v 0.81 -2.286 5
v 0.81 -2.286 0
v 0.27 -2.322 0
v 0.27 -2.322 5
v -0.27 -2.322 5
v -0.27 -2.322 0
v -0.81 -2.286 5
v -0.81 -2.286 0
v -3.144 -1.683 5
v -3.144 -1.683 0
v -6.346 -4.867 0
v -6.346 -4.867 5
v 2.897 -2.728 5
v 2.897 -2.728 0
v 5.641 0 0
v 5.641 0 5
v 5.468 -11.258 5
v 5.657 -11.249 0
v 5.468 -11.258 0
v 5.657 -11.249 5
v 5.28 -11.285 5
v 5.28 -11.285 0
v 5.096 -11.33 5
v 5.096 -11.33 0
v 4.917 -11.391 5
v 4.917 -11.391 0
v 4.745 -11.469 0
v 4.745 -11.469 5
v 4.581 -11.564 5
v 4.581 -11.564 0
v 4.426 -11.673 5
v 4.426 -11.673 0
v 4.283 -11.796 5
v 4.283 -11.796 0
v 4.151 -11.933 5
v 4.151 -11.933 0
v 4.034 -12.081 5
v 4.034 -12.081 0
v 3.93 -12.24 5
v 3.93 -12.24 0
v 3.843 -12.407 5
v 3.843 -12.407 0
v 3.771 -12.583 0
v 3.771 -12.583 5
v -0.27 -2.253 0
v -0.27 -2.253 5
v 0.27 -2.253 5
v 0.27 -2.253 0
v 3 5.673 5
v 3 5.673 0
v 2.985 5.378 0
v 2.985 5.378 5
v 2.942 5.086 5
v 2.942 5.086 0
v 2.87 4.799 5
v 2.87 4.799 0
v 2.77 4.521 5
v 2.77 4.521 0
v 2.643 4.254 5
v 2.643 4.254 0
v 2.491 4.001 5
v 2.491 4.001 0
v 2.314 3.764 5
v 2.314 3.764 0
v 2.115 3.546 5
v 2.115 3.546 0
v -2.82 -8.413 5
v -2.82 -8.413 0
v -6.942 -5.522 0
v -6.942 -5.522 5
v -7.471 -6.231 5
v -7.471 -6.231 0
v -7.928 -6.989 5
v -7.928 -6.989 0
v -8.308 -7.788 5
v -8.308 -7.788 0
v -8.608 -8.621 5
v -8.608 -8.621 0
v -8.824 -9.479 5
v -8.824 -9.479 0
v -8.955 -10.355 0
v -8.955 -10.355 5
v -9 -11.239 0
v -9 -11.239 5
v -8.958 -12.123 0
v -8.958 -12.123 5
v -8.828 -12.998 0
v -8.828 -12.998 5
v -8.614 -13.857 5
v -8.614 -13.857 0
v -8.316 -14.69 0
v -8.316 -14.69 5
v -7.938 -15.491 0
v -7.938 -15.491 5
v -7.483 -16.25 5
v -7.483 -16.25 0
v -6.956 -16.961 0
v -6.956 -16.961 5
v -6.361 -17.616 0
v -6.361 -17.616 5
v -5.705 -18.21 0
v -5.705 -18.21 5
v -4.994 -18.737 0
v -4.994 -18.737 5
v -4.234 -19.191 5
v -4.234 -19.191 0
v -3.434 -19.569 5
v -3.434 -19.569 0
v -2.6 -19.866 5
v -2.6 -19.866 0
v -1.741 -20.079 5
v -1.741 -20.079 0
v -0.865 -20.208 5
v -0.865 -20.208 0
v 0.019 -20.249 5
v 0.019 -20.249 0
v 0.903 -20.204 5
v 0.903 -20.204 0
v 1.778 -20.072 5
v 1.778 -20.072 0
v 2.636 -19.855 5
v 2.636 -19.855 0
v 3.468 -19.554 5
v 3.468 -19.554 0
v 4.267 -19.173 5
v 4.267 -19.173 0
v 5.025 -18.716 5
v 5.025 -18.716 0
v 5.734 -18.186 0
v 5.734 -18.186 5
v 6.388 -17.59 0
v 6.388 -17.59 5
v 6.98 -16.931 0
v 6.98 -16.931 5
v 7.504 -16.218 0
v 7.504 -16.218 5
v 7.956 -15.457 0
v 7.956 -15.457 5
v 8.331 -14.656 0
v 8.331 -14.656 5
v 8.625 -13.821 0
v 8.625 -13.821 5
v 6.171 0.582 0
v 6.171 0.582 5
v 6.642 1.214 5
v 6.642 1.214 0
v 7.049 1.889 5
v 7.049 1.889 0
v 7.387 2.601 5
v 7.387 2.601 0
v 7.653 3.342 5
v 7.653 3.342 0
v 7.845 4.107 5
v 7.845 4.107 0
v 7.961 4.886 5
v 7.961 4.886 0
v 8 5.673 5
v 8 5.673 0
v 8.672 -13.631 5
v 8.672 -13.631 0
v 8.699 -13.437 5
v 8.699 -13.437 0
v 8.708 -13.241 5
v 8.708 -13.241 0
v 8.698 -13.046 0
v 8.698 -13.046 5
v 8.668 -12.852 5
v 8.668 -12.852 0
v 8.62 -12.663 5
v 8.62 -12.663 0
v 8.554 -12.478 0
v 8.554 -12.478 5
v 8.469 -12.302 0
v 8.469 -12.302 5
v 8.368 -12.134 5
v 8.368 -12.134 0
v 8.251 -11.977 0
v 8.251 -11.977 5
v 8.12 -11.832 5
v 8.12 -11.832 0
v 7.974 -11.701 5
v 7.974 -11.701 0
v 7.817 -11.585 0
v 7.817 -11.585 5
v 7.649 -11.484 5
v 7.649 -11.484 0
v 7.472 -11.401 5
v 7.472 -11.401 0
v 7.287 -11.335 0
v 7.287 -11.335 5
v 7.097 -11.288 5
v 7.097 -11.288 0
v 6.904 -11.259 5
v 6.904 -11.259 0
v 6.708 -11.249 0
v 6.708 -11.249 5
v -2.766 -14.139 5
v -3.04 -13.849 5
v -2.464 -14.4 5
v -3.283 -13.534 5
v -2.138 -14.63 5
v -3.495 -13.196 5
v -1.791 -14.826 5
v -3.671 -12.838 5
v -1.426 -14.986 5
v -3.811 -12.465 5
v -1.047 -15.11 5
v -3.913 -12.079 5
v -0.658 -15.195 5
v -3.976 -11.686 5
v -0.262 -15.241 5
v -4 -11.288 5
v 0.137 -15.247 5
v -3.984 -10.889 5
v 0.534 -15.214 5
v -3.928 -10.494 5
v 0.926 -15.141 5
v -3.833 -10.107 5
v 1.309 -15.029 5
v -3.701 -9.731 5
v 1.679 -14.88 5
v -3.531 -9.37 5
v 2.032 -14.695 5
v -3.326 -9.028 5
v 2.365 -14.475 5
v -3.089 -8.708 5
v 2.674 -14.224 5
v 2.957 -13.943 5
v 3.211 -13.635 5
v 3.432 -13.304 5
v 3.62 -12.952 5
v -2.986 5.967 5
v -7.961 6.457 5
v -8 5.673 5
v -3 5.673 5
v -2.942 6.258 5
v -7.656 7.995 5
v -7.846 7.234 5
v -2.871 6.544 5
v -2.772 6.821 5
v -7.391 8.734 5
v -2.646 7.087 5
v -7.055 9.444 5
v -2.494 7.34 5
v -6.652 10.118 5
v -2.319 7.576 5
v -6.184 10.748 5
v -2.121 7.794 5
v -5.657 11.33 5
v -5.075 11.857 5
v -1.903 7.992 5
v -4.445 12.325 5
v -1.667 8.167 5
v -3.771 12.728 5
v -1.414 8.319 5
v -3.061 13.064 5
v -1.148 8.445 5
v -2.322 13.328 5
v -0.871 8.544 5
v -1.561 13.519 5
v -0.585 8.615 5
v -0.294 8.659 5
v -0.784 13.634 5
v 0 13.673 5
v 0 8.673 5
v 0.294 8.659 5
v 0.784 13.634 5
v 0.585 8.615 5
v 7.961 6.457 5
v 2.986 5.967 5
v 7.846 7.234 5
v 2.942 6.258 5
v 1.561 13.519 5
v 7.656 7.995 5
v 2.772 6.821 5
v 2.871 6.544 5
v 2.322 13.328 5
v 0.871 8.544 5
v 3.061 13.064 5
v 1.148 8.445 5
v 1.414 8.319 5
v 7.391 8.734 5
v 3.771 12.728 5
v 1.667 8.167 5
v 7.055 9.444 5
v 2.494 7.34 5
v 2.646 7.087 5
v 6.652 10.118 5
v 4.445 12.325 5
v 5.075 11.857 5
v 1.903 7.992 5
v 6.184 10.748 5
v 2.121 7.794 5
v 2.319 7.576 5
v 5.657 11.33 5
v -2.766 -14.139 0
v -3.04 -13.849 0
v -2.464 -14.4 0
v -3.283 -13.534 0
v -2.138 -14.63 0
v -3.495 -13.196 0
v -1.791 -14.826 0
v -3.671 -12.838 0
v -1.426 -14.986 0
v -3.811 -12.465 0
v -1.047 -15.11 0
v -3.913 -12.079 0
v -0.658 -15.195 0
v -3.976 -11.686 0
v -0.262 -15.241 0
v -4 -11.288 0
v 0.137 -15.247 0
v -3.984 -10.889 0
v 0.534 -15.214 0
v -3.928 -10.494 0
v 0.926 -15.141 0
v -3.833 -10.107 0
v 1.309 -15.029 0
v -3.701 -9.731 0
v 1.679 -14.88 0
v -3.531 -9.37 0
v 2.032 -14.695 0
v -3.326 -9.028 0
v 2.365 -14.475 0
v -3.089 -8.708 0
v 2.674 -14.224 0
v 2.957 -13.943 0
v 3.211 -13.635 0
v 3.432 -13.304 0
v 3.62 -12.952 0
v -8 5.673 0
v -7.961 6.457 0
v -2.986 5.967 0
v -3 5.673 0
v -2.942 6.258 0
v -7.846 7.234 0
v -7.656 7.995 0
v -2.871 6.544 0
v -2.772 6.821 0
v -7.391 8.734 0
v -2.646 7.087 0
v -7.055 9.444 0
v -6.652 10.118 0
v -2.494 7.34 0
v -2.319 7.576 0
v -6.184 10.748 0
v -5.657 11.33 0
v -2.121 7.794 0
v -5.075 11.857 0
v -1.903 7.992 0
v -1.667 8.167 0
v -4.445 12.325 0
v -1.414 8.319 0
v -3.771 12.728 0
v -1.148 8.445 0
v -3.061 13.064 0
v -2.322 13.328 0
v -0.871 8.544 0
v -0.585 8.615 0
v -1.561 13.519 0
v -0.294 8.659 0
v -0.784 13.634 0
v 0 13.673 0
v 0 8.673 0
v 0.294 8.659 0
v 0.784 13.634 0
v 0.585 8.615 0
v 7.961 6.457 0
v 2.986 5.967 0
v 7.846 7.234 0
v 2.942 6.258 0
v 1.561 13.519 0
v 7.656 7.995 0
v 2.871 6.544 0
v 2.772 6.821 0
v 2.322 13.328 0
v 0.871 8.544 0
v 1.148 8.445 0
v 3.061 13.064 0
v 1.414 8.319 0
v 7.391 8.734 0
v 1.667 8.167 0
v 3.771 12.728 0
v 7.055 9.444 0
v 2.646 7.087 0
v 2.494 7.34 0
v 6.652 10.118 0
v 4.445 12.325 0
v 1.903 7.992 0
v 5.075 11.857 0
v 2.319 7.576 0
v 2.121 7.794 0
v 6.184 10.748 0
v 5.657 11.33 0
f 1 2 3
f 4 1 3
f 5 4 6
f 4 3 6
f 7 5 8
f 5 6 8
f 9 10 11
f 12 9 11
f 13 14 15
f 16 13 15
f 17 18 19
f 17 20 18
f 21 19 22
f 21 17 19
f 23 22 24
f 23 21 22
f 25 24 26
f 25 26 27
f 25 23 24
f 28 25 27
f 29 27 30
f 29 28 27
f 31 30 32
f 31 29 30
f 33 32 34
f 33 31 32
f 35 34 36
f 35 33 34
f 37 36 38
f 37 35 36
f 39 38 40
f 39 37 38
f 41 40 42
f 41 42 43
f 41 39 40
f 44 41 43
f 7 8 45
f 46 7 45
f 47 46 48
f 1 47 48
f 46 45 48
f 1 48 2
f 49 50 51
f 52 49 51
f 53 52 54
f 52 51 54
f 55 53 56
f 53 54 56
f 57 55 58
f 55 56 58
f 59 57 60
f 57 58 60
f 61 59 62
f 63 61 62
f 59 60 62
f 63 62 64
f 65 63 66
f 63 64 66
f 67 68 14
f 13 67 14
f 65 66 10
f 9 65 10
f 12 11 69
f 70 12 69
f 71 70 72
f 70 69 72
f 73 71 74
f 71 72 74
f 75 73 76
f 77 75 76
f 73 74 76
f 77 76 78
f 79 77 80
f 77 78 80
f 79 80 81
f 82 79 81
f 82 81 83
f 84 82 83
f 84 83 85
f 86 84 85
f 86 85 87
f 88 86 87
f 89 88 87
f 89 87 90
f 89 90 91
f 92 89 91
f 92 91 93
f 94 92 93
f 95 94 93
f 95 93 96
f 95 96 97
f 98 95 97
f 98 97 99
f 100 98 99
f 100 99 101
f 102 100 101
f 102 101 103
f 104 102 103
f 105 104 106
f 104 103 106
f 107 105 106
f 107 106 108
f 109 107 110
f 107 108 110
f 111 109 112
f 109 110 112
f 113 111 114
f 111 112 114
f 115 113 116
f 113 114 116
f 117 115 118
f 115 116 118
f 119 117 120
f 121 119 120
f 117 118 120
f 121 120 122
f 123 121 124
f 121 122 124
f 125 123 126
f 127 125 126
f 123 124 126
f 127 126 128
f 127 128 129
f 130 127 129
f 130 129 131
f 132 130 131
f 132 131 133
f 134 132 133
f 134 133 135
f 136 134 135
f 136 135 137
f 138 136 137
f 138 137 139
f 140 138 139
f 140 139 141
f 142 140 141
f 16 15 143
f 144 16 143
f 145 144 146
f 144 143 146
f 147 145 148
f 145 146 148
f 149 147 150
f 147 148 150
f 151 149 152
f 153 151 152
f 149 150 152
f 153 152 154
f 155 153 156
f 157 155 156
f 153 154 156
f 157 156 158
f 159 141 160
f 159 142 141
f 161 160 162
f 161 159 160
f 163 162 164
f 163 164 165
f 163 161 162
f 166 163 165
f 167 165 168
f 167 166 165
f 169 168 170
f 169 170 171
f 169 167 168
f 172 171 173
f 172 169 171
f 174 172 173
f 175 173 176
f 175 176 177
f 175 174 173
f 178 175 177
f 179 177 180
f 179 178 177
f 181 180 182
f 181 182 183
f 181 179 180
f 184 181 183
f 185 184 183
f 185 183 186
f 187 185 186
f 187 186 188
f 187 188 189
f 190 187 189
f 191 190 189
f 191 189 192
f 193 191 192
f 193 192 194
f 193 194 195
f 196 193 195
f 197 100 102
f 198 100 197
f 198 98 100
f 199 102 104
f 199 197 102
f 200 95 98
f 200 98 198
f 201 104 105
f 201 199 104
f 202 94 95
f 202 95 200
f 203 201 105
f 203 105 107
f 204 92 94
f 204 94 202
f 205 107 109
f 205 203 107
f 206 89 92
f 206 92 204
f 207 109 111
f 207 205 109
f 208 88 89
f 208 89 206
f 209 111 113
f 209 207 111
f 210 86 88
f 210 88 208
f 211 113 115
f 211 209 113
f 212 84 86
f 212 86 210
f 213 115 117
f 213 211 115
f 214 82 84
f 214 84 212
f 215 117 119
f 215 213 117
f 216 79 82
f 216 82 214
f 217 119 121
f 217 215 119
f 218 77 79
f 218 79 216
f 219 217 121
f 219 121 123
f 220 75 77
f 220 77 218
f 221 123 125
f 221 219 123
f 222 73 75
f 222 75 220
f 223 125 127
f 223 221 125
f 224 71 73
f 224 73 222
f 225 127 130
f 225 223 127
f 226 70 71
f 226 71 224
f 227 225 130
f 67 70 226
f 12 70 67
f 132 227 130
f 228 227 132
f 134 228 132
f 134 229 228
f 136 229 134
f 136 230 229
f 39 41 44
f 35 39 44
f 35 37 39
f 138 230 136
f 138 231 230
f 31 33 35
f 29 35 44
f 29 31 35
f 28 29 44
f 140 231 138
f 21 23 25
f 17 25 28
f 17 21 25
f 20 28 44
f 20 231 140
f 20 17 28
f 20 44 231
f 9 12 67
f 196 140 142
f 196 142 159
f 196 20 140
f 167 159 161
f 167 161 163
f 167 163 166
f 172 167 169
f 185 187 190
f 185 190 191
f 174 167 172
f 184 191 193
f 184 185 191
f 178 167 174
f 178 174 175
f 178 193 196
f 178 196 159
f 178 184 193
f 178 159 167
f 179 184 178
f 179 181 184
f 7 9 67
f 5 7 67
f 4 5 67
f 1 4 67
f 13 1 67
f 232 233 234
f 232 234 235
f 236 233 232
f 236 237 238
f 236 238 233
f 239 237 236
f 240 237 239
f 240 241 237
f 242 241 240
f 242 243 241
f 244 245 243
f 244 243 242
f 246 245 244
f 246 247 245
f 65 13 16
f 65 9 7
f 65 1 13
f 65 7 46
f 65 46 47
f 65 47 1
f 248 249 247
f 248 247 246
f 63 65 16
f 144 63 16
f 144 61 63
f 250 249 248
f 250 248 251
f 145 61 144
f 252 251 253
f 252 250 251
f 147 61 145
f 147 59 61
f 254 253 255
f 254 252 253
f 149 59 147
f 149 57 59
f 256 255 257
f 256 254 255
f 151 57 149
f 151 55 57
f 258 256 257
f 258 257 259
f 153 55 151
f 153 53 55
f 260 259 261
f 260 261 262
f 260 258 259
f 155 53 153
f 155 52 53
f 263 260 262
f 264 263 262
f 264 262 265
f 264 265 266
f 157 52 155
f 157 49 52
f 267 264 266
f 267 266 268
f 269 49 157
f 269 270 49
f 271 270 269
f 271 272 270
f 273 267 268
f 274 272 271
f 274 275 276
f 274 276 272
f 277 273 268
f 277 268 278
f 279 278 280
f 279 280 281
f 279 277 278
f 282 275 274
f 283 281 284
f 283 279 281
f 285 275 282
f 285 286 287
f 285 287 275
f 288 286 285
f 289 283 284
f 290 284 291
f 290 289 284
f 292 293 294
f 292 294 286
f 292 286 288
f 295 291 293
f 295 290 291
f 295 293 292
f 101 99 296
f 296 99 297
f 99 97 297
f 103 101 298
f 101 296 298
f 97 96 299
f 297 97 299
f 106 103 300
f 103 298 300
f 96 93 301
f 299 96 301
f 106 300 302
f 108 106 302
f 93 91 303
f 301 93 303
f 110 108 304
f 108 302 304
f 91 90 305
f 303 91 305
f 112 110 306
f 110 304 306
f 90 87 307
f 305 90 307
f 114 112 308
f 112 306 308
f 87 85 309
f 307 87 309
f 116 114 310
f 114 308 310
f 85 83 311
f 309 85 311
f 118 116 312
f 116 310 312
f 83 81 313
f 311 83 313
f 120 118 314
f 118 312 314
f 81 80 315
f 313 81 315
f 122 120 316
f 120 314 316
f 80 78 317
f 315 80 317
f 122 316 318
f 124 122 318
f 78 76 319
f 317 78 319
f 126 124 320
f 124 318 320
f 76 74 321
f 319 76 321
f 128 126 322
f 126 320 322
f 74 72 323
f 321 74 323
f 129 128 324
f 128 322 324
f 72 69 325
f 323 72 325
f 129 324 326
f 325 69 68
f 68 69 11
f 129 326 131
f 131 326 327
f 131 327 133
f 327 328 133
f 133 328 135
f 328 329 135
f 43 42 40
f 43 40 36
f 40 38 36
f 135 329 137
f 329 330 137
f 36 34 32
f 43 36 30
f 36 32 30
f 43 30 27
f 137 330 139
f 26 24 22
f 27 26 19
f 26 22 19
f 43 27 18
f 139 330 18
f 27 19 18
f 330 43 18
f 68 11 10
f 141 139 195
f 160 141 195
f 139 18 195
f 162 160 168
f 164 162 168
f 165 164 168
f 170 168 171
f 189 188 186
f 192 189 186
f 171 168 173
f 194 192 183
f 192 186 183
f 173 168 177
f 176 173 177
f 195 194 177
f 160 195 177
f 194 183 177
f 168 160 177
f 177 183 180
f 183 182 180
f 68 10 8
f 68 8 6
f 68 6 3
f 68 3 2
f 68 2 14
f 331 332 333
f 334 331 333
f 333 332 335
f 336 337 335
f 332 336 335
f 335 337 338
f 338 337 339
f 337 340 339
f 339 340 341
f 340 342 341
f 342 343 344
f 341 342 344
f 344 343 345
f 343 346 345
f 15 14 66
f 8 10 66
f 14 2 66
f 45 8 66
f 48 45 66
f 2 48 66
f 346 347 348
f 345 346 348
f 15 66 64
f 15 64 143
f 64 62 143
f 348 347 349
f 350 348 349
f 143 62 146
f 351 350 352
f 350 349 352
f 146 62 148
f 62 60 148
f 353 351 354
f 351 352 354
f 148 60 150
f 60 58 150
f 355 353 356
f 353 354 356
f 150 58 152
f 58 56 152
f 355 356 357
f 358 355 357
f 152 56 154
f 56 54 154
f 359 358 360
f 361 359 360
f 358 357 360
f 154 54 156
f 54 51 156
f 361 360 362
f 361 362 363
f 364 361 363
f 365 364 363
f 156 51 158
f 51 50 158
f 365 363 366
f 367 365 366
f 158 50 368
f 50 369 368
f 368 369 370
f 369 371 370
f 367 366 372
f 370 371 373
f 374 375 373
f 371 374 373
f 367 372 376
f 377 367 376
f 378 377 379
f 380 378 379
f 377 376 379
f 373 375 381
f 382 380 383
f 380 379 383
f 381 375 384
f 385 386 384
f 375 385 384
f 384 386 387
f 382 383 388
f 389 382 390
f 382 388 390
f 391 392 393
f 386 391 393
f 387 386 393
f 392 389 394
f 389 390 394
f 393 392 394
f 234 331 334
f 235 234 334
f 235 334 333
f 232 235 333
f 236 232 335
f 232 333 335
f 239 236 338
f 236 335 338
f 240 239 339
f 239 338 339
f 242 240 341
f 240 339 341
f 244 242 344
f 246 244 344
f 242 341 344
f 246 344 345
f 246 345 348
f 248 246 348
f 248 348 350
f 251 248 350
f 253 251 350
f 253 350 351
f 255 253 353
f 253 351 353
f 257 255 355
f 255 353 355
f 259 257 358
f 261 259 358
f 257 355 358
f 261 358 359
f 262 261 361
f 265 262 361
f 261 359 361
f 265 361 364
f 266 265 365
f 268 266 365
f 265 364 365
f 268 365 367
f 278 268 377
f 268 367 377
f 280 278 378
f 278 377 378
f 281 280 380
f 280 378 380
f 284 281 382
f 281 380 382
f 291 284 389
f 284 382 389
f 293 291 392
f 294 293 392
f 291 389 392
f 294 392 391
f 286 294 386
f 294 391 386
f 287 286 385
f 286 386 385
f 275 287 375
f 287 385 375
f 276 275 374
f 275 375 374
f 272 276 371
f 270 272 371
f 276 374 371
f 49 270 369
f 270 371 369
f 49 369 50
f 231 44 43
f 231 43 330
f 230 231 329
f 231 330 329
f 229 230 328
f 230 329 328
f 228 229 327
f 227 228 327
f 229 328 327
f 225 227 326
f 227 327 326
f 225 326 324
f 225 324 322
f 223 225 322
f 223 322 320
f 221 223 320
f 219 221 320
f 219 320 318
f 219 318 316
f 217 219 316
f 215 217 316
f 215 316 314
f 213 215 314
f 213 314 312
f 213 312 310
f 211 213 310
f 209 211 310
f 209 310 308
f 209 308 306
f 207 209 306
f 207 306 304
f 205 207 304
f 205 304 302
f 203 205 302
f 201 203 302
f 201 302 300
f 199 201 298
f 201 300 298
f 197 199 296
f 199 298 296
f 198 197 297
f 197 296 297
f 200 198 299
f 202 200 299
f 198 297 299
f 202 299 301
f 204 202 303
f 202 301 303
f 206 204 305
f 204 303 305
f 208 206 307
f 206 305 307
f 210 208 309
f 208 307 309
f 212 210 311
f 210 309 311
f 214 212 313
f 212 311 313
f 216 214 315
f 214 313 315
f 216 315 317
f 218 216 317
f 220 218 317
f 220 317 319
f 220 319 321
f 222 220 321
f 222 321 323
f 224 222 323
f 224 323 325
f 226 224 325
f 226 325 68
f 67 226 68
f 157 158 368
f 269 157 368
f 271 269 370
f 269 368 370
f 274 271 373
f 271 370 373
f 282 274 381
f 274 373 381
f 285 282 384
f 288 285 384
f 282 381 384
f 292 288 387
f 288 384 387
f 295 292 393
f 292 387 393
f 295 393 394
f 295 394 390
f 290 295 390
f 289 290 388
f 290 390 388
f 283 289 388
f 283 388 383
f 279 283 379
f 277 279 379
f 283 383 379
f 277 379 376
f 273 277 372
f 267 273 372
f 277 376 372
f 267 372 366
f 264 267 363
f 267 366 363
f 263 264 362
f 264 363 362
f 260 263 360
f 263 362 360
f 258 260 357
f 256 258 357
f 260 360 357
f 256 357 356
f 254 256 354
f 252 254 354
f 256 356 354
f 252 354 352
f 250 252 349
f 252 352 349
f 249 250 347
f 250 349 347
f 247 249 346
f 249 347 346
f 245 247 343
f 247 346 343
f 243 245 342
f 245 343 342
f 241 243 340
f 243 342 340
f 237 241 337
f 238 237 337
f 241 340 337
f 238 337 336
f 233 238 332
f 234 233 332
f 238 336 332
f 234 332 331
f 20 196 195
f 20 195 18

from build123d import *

# Parameters (mm, degrees)
F1_DEPTH = 5
F2_R     = 2


with BuildPart() as f1:
    # F0 (on Top) → F1 (new body)
    with BuildSketch(Plane.XY):
        with BuildLine():
            ThreePointArc((-3, 5.6729591845), (0, 8.6729591845), (3, 5.6729591845))
            ThreePointArc((3, 5.6729591845), (2.7699992103, 4.5209590217), (2.1152637499, 3.5455994903))
            Line((2.1152637499, 3.5455994903), (-3.1437101653, -1.6834724502))
            ThreePointArc((-3.1437101653, -1.6834724502), (-1.9996201414, -2.073105577), (-0.8098901638, -2.2859401064))
            ThreePointArc((-0.8098901638, -2.2859401064), (0, -2.2494259195), (0.8098901638, -2.2859401064))
            ThreePointArc((0.8098901638, -2.2859401064), (3.4218298698, -1.5582979913), (5.640703333, 0))
            ThreePointArc((5.640703333, 0), (7.3866645607, 2.6009587503), (8, 5.6729591845))
            ThreePointArc((8, 5.6729591845), (0, 13.6729591845), (-8, 5.6729591845))
            Line((-8, 5.6729591845), (-3, 5.6729591845))
        make_face()
        with BuildLine():
            ThreePointArc((-0.8098901638, -2.2859401064), (-1.9996201414, -2.073105577), (-3.1437101653, -1.6834724502))
            Line((-3.1437101653, -1.6834724502), (-6.3457912496, -4.867346837))
            ThreePointArc((-6.3457912496, -4.867346837), (-3.8035324765, -3.0926409708), (-0.8098901638, -2.2859401064))
        make_face()
        with BuildLine():
            Line((2.8967557262, -2.7283458082), (5.640703333, 0))
            ThreePointArc((5.640703333, 0), (3.4218298698, -1.5582979913), (0.8098901638, -2.2859401064))
            ThreePointArc((0.8098901638, -2.2859401064), (1.8664770664, -2.4450938404), (2.8967557262, -2.7283458082))
        make_face()
        with BuildLine():
            ThreePointArc((0.8098901638, -2.2859401064), (0, -2.3270408155), (-0.8098901638, -2.2859401064))
            ThreePointArc((-0.8098901638, -2.2859401064), (-3.8035324765, -3.0926409708), (-6.3457912496, -4.867346837))
            ThreePointArc((-6.3457912496, -4.867346837), (-3.4560004885, -19.5594235503), (9, -11.2494259195))
            Line((9, -11.2494259195), (4, -11.2494259195))
            ThreePointArc((4, -11.2494259195), (-1.5360002171, -14.9427581999), (-2.8203516665, -8.4129463273))
            Line((-2.8203516665, -8.4129463273), (2.8967557262, -2.7283458082))
            ThreePointArc((2.8967557262, -2.7283458082), (1.8664770664, -2.4450938404), (0.8098901638, -2.2859401064))
        make_face()
    extrude(amount=F1_DEPTH)

    # F2
    f2_edges = [f1.edges().sort_by_distance(p)[0] for p in [
        (4, -11.249426, 2.5),
        (9, -11.249426, 2.5),
    ]]
    fillet(f2_edges, radius=F2_R)


solid = f1.part
